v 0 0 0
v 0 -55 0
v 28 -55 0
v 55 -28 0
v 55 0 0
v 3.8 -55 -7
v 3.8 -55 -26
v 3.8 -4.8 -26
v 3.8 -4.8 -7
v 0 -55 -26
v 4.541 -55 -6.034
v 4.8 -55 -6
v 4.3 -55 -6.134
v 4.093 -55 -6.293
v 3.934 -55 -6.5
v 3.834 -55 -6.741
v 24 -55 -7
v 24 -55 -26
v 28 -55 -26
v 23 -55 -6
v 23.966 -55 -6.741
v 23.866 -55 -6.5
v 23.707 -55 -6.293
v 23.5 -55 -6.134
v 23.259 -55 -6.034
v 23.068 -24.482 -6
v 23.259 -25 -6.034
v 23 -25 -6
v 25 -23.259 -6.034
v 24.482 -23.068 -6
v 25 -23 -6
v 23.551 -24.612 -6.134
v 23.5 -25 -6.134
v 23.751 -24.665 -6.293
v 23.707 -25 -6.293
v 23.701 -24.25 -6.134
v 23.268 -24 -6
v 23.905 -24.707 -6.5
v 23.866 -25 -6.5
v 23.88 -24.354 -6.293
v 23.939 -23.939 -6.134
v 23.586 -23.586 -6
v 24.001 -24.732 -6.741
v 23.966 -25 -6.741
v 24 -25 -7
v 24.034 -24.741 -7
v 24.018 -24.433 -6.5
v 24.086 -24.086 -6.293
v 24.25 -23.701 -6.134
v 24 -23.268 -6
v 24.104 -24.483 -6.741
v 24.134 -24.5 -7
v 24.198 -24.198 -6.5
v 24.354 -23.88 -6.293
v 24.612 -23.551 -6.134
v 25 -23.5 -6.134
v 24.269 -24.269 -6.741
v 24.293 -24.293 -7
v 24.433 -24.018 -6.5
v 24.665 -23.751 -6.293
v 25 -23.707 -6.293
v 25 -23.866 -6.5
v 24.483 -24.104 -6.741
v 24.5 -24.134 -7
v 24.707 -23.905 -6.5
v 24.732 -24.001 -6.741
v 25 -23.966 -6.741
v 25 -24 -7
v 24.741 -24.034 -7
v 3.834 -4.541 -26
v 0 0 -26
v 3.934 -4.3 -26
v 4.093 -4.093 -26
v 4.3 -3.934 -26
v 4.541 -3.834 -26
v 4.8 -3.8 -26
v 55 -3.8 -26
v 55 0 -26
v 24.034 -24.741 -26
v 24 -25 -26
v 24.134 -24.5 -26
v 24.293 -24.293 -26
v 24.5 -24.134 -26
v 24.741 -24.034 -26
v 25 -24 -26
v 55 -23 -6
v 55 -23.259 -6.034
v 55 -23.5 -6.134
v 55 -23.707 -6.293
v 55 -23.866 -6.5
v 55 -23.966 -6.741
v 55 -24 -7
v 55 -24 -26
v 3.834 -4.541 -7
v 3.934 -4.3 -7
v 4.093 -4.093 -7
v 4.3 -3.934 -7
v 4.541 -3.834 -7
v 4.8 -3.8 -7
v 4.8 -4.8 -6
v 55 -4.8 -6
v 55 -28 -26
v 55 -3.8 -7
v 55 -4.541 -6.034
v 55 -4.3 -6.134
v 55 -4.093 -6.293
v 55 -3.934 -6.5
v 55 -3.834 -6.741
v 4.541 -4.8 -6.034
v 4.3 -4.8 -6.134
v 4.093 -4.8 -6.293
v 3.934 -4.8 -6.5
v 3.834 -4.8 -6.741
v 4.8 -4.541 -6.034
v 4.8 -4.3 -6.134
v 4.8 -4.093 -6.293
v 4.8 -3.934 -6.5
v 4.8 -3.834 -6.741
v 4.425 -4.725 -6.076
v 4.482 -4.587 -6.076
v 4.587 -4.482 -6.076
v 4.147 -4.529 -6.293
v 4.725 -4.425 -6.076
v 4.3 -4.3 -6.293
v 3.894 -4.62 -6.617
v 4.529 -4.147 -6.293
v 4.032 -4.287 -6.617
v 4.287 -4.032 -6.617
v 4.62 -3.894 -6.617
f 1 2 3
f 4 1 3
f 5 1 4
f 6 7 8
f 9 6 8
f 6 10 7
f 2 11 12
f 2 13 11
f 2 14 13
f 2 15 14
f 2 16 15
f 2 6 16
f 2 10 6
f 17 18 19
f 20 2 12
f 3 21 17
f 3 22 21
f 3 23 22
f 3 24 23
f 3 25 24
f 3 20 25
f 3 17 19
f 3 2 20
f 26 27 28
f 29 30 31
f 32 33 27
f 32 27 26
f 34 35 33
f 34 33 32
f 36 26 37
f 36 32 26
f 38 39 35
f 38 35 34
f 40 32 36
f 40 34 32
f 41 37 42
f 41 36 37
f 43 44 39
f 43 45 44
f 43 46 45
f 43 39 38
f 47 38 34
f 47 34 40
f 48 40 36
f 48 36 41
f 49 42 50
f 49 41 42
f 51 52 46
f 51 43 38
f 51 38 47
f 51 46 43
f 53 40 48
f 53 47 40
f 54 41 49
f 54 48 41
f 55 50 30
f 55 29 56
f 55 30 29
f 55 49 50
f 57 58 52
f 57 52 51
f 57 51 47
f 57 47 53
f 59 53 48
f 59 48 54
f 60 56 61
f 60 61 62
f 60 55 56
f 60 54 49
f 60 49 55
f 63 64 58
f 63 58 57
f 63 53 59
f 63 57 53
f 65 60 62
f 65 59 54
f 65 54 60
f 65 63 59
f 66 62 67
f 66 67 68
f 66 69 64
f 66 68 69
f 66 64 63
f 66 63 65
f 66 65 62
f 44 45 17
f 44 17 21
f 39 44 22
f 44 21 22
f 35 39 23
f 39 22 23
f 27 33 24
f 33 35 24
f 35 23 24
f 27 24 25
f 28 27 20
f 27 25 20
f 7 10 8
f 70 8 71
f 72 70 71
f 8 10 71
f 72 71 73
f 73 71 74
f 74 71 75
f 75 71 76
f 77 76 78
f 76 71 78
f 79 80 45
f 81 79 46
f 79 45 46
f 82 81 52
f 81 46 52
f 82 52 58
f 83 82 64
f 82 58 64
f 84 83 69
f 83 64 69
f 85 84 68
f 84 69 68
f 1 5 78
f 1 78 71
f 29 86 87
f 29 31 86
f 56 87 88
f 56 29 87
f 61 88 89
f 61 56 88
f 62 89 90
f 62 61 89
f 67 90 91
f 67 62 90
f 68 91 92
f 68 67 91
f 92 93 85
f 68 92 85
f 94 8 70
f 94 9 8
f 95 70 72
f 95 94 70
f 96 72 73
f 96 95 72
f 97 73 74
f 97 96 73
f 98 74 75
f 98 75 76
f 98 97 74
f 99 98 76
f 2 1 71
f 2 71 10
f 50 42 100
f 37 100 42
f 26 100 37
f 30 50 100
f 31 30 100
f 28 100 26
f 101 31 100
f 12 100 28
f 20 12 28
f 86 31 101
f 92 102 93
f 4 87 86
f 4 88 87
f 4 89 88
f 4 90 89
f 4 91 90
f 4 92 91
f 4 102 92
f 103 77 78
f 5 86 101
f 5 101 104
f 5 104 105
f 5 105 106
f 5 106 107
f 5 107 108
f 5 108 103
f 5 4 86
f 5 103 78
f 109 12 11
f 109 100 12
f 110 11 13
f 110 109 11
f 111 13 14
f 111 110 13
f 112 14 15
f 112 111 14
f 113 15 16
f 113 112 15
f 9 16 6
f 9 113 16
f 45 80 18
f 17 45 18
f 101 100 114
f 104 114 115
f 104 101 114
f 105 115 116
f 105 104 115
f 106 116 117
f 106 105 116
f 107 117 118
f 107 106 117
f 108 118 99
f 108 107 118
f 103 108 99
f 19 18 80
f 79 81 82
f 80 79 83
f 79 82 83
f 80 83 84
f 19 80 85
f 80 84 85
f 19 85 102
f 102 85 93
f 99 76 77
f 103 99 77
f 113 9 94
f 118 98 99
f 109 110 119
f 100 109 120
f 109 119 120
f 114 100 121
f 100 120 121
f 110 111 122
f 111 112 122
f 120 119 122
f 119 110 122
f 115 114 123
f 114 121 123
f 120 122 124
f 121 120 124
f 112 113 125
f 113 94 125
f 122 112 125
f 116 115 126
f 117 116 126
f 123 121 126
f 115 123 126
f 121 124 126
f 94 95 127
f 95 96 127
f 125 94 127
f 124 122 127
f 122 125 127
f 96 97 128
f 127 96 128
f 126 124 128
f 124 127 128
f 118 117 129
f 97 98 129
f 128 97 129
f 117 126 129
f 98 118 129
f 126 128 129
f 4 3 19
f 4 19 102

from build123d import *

# Parameters (mm, degrees)
F1_DEPTH = 26
F3_DEPTH = 20
F4_R     = 1


with BuildPart() as f1:
    # F0 (on Top) → F1 (new body)
    with BuildSketch(Plane.XY):
        Polygon((0, 0), (0, -55), (28, -55), (55, -28), (55, 0), align=None)
    extrude(amount=-F1_DEPTH)

    # F2 (on face) → F3 (cut)
    with BuildSketch(Plane(origin=(0, 0, -26), x_dir=(1, 0, 0), z_dir=(0, 0, -1))):
        Polygon((24, 55), (3.8, 55), (3.8, 3.8), (55, 3.8), (55, 24), (24, 24), align=None)
    extrude(amount=-F3_DEPTH, mode=Mode.SUBTRACT)

    # F4
    f4_edges = [f1.edges().sort_by_distance(p)[0] for p in [
        (3.8, -3.8, -16),
        (3.8, -29.4, -6),
        (29.4, -3.8, -6),
        (24, -39.5, -6),
        (39.5, -24, -6),
        (24, -24, -16),
    ]]
    fillet(f4_edges, radius=F4_R)


solid = f1.part
